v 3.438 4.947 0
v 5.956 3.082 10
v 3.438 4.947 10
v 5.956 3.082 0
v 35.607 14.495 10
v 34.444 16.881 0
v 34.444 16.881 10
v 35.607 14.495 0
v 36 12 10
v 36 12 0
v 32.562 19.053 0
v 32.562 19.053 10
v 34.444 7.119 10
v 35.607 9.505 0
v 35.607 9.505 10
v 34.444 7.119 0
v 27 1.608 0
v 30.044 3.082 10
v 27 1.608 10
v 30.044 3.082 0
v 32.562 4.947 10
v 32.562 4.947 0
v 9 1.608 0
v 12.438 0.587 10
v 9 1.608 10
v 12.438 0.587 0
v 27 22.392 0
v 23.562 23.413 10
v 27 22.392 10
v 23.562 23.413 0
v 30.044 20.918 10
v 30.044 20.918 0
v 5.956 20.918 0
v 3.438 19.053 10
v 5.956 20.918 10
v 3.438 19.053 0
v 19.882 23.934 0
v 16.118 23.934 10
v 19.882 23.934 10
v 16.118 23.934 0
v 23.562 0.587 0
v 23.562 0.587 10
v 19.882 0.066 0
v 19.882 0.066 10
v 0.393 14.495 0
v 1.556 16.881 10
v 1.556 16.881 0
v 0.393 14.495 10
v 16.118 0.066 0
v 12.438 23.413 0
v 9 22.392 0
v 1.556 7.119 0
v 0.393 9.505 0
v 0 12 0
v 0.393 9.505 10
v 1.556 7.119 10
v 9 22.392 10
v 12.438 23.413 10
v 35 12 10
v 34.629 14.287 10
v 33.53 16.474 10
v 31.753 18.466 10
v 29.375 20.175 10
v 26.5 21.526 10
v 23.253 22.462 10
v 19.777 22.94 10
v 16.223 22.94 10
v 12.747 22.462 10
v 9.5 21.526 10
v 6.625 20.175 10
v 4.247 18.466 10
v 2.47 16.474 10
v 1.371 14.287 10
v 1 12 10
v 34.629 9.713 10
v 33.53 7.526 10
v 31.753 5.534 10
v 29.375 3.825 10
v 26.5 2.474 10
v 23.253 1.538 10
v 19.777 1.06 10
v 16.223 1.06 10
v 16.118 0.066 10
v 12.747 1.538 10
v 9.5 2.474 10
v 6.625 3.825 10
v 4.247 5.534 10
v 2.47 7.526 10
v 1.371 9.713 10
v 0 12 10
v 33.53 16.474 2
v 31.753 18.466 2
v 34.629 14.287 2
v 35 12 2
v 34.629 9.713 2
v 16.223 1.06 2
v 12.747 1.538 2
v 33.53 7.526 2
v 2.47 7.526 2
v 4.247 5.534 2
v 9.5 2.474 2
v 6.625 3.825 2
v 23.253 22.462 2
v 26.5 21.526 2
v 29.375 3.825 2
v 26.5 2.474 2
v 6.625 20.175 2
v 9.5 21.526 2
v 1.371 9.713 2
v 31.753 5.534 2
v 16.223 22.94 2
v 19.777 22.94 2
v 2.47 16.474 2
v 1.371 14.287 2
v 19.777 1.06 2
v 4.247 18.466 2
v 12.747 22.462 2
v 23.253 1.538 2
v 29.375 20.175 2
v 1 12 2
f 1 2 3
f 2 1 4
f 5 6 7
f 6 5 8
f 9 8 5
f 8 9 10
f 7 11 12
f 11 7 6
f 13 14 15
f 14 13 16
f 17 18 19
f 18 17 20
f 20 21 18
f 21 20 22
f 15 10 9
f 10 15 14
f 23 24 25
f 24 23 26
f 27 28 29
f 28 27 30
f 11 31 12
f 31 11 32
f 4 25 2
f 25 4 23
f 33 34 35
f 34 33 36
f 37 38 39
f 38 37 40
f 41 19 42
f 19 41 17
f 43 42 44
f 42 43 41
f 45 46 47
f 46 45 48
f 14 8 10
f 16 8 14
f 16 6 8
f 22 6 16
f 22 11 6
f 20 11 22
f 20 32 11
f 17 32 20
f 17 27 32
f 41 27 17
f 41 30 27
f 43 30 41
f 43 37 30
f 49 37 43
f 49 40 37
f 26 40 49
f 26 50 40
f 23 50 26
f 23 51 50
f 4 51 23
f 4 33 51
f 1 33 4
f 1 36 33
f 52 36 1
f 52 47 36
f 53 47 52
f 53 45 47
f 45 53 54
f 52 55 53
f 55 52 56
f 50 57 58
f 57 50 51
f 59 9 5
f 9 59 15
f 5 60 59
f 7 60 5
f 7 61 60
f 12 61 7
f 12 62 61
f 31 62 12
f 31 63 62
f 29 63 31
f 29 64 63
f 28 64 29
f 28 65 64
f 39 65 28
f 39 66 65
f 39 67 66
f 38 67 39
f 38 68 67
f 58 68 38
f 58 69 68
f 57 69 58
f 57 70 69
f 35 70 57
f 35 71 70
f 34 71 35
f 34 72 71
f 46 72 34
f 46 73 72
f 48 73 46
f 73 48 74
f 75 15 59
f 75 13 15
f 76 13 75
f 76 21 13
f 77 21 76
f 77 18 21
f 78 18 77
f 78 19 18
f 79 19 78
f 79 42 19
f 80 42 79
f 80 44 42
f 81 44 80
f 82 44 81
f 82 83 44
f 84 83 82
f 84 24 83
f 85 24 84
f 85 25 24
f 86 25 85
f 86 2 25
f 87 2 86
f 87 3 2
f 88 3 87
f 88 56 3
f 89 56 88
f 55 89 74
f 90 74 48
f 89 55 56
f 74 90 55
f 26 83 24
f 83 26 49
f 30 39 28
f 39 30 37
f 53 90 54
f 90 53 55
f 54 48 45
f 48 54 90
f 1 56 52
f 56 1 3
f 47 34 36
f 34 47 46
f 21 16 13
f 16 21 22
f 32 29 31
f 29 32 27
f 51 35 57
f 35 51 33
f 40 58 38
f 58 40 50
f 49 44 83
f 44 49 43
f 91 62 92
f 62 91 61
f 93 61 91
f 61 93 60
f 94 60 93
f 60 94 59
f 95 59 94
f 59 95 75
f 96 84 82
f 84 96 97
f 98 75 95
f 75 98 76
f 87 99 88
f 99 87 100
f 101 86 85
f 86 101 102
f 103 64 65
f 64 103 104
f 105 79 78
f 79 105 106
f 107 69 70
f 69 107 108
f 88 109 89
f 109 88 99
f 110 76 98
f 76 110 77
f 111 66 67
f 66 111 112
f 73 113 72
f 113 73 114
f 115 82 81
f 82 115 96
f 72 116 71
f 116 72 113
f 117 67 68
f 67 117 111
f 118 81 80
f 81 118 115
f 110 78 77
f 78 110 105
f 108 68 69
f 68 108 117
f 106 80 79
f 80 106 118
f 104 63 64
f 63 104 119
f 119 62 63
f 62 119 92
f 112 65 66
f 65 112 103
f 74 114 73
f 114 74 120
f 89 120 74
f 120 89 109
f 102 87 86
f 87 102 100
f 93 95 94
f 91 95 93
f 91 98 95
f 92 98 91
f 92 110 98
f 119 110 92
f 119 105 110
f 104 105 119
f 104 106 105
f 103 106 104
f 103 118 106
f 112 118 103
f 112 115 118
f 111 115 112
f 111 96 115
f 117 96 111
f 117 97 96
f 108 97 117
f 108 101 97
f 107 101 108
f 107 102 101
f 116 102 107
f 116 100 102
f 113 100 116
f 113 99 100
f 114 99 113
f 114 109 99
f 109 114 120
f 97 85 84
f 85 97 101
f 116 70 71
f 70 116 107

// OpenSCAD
_bottleDepth = 20;
_bottleWidth = 32;

_bottleTolerance = 1;
_bottlePadding = 1;

_bottleWall = 10;

_thickness = 2;

// Depth
overallDepth = 200;

insideWidth = _bottleWidth + 2 * _bottleTolerance;
insideDepth = _bottleDepth + 2 * _bottleTolerance;

outsideWidth = insideWidth + 2 * _bottleTolerance;
outsideDepth = insideDepth + 2 * _bottlePadding;

bottleWell();

//assembly();

module assembly() {
    angle = 60;

    xOffset = (outsideWidth - _bottlePadding / 2) * cos(angle);
    yOffset = (outsideDepth - _bottlePadding / 2) * sin(angle);

    rows = floor(overallDepth / yOffset) - 1;
    echo(rows=rows);

    usedDepth = ((rows) * yOffset) + (outsideDepth);
    echo(overallDepth=overallDepth, usedDepth = usedDepth);

    centeringOffset = (overallDepth - usedDepth) / 2;
    echo(centeringOffset=centeringOffset);

    intersection() 
    {
        cube([outsideWidth * 1/2, overallDepth, _bottleWall]);  // Half
        
        //cube([outsideWidth, overallDepth, _bottleWall]);  // Full
        
        union() {
            cube([outsideWidth, overallDepth, _thickness]);
            
            //translate([0, centeringOffset, 0]) {    //center
            //translate([-outsideWidth, centeringOffset, 0]) {  // Left
            translate([outsideWidth * 1/2, centeringOffset, 0]) { // Right
                union() {
                    union() {
                        for(r = [1:2:rows]) {
                            translate([xOffset, r * yOffset, 0]) {
                                bottleWell();
                            }

                            translate([-xOffset, r * yOffset, 0]) {
                                bottleWell();
                            }
                        }
                    }
                    
                    union() {
                        for(r = [0:2:rows]) {
                            translate([0, r * yOffset, 0]) {
                                bottleWell();
                            }
                        }
                    }
                }
            }
        }
    }
}



module bottleWell() {
    //cutoutWidth = _bottleWidth - (2 * _thickness + 2 * _bottleTolerance);
    //cutoutDepth = _bottleDepth - (2 * _thickness + 2 * _bottleTolerance);

    translate([outsideWidth / 2, outsideDepth / 2, 0]) {
        difference() {
            oval(outsideWidth, outsideDepth, _bottleWall);
        
            translate([0, 0, _thickness]) {                        
                oval(insideWidth, insideDepth, _bottleWall);
            }
            
            //oval(cutoutWidth, cutoutDepth, );
        }
    }
    
    module oval(x,y,h) {
        scale([x/y,1,1]) 
            cylinder(h, d=y);
    }
}
